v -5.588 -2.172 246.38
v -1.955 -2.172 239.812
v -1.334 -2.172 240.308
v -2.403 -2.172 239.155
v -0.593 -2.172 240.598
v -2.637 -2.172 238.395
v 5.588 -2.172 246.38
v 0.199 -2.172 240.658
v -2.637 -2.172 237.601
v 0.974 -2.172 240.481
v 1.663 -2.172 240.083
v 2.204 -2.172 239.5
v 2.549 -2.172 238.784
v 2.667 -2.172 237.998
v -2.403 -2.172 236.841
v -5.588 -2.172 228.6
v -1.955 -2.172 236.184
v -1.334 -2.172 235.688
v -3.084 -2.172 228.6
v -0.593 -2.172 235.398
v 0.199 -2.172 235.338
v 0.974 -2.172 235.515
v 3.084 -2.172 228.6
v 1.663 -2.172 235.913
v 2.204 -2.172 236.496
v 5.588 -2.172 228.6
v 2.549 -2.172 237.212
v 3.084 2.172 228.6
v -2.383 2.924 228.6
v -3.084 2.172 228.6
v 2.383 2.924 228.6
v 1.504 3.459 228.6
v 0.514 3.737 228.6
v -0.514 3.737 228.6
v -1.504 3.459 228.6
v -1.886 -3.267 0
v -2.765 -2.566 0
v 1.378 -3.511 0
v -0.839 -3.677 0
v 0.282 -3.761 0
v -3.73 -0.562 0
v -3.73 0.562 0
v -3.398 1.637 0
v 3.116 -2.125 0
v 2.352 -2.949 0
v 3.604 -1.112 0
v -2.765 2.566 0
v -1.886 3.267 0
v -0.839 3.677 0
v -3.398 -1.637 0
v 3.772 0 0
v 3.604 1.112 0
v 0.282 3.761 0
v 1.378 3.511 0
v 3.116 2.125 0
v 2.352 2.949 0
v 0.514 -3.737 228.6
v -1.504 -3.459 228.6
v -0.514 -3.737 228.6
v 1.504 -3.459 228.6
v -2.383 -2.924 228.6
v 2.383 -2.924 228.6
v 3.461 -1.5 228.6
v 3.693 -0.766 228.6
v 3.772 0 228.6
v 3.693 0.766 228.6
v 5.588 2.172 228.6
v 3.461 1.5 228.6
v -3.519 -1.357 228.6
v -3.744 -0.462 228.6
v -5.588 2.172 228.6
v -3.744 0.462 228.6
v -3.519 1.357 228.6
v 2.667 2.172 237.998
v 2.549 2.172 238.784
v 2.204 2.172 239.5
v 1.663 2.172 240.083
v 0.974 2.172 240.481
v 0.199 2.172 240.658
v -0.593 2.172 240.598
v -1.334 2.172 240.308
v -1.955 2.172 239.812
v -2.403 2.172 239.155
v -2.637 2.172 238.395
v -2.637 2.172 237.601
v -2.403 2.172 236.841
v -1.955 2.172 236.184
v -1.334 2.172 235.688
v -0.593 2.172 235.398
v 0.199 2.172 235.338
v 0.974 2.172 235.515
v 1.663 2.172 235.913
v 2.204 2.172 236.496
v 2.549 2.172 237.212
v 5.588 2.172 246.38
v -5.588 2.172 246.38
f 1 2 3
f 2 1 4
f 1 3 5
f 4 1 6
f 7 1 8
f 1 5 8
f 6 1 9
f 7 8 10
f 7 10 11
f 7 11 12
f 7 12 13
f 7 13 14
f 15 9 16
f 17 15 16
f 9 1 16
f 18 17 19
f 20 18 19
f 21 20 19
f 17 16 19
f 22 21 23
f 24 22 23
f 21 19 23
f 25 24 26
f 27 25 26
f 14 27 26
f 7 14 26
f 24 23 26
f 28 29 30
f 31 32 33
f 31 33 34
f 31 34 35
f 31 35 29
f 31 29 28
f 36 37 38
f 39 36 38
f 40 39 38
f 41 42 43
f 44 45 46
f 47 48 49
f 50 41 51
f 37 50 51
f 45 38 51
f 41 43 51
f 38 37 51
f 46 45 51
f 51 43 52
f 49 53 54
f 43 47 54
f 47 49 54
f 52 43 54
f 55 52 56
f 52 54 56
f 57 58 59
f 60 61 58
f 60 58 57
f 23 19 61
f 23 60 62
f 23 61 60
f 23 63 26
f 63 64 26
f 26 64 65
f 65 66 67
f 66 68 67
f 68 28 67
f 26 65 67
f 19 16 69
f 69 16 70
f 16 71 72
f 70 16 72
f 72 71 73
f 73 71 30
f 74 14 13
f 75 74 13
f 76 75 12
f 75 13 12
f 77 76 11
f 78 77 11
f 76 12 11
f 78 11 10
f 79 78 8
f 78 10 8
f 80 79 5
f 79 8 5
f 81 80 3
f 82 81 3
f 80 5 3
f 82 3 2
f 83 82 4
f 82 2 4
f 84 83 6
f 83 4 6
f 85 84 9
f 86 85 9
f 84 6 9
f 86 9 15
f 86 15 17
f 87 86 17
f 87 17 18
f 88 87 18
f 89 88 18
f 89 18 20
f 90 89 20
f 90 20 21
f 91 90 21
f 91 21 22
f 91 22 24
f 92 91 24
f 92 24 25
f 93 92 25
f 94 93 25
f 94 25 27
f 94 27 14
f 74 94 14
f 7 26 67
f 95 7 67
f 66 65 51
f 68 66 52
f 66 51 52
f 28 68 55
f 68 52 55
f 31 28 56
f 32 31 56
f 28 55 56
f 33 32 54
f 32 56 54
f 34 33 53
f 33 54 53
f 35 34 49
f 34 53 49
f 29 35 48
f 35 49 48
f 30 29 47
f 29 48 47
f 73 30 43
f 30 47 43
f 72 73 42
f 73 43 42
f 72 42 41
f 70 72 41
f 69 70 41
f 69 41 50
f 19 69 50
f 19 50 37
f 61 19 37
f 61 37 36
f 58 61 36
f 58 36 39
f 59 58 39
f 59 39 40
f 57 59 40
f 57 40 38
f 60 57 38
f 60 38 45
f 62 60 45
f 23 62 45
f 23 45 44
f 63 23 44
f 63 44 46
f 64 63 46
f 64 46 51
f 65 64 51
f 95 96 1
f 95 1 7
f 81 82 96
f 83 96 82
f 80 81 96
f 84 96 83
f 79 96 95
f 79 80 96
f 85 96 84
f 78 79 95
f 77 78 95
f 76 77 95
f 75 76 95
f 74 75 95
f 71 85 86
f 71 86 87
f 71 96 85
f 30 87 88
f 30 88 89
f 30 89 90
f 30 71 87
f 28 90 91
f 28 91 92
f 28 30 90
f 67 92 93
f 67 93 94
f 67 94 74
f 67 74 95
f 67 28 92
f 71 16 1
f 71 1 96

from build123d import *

# Parameters (mm, degrees)
F0_R     = 3.7719
F1_DEPTH = 228.6
F2_W     = 11.176
F2_H     = 4.3434
F3_DEPTH = 17.78
F5_D     = 5.334


with BuildPart() as f1:
    # F0 (on Top) → F1 (new body)
    with BuildSketch(Plane.XY):
        Circle(F0_R)
    extrude(amount=F1_DEPTH)

    # F2 (on face) → F3 (join)
    with BuildSketch(Plane.XY.offset(228.6)):
        Rectangle(F2_W, F2_H)
    extrude(amount=F3_DEPTH)

    # F5 (through all)
    with Locations(Plane(origin=(0, 2.1717, 0), x_dir=(-1, 0, 0), z_dir=(0, 1, 0))):
        with Locations((0, 237.998)):
            Hole(F5_D / 2)


solid = f1.part
